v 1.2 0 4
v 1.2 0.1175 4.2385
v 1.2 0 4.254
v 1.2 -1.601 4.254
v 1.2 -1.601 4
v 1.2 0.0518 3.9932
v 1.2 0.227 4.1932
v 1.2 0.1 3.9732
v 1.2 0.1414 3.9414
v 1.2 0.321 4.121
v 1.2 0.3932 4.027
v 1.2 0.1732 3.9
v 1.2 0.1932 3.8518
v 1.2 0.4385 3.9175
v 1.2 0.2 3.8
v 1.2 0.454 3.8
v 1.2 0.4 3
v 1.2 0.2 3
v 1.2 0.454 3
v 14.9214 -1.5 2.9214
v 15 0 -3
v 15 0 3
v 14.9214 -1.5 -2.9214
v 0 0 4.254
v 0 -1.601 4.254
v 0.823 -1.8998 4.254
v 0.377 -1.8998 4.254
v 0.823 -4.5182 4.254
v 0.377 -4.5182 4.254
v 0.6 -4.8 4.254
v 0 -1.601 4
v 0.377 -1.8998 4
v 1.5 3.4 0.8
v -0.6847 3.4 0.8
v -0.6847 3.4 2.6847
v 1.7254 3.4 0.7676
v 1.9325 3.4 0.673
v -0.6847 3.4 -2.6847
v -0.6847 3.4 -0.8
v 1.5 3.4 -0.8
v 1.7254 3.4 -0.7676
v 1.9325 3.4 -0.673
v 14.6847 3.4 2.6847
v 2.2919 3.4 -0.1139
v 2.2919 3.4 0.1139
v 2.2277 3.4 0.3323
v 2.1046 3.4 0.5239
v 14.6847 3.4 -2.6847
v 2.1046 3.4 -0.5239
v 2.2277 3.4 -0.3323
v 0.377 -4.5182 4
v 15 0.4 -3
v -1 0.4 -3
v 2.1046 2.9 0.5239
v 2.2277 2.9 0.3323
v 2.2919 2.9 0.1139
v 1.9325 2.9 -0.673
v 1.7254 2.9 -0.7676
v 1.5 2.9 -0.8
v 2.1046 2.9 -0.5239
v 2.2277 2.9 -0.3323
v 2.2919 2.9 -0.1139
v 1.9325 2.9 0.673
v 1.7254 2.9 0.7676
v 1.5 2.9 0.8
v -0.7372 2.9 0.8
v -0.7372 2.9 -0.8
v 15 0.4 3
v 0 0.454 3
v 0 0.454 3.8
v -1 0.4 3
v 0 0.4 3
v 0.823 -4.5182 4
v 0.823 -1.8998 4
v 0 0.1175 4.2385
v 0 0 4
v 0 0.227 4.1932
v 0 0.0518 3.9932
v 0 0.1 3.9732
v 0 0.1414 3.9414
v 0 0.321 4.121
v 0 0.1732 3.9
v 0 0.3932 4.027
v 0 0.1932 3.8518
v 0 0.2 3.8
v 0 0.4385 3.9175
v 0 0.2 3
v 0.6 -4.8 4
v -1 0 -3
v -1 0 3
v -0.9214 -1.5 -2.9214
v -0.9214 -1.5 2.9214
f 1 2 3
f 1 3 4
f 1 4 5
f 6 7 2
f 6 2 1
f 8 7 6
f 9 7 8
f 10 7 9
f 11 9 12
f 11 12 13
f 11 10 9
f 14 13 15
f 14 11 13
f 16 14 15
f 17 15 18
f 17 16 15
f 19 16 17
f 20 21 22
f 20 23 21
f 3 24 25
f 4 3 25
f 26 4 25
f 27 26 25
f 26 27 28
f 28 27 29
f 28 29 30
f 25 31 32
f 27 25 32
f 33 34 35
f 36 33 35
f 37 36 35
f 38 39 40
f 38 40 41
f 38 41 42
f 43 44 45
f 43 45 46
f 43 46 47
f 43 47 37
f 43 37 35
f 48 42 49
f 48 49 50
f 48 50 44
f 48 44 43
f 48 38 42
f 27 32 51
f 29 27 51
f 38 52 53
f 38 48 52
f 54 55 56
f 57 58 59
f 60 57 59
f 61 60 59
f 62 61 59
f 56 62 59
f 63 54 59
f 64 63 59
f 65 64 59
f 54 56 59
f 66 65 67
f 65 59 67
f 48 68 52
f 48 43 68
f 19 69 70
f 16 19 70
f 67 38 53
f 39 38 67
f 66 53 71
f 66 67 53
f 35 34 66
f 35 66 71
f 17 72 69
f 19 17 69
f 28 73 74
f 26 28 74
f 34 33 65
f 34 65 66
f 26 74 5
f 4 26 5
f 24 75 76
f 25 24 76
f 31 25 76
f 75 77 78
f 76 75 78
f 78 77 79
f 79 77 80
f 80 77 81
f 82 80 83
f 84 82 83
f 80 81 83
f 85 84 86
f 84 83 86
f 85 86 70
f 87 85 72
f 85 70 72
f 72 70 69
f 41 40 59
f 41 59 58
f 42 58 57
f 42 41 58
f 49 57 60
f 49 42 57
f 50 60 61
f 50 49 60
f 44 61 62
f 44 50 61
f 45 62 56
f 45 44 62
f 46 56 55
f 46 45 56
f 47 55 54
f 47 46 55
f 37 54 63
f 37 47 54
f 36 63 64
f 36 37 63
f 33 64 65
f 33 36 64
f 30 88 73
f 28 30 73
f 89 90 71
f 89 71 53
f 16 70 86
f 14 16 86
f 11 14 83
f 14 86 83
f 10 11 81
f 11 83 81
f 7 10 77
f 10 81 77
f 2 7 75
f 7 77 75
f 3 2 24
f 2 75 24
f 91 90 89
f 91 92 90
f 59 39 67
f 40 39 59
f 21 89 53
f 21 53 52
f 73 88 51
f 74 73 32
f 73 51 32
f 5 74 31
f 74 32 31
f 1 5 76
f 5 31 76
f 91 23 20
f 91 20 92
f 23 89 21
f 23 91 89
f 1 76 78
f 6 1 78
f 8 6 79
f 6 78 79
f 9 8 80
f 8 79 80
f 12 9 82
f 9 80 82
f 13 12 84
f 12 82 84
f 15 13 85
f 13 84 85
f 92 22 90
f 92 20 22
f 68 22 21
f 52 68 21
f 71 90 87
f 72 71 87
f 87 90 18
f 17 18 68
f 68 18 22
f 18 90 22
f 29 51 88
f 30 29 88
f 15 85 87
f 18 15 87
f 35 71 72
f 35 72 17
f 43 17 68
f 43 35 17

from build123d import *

# Parameters (mm, degrees)
SKETCH_1_W          = 16
SKETCH_1_H          = 6
EXTRUDE_1_DEPTH     = 0.4
SKETCH_2_W          = 16
SKETCH_2_H          = 6
EXTRUDE_2_DEPTH     = 3
EXTRUDE_2_TAPER     = 6
SKETCH_3_W          = 16
SKETCH_3_H          = 6
EXTRUDE_3_DEPTH     = 1.5
EXTRUDE_3_TAPER     = 3
CUT_EXTRUDE_4_DEPTH = 0.5
EXTRUDE_1_2_DEPTH   = 1.2
CUT_EXTRUDE_START   = -0.254
CUT_EXTRUDE_5_DEPTH = 0.254


# Read off the part's stored shape, not the designer's step: 伸長-薄件1
with BuildPart() as part:
    # 草圖1 → Extrude 1 (new body)
    with BuildSketch(Plane(origin=(0, 0, 0), x_dir=(1, 0, 0), z_dir=(0, 1, 0))):
        with Locations((7, 0)):
            Rectangle(SKETCH_1_W, SKETCH_1_H)
    extrude(amount=EXTRUDE_1_DEPTH)

    # 草圖2 → 伸長2 (add)
    with BuildSketch(Plane(origin=(0, 0.4, 0), x_dir=(1, 0, 0), z_dir=(0, 1, 0))):
        with Locations((7, 0)):
            Rectangle(SKETCH_2_W, SKETCH_2_H)
    extrude(amount=EXTRUDE_2_DEPTH, taper=EXTRUDE_2_TAPER)

    # 草圖3 → 伸長3 (add)
    with BuildSketch(Plane(origin=(0, 0, 0), x_dir=(-1, 0, 0), z_dir=(0, -1, 0))):
        with Locations((-7, 0)):
            Rectangle(SKETCH_3_W, SKETCH_3_H)
    extrude(amount=EXTRUDE_3_DEPTH, taper=EXTRUDE_3_TAPER)

    # 草圖4 → 伸長4 (cut)
    with BuildSketch(Plane(origin=(0, 3.4, 0), x_dir=(1, 0, 0), z_dir=(0, 1, 0))):
        with BuildLine():
            Line((-1, 0.8), (1.5, 0.8))
            ThreePointArc((1.5, 0.8), (2.3, 0), (1.5, -0.8))
            Line((1.5, -0.8), (-1, -0.8))
            Line((-1, -0.8), (-1, 0.8))
        make_face()
    extrude(amount=-CUT_EXTRUDE_4_DEPTH, mode=Mode.SUBTRACT)

    # Extrude 1 2 outline → Extrude 1 2 (add)
    with BuildSketch(Plane(origin=(0, 0, 0), x_dir=(0, 0, -1), z_dir=(1, 0, 0))):
        with BuildLine():
            Line((-3, 0.2), (-3, 0.454))
            Line((-3, 0.454), (-3.8, 0.454))
            ThreePointArc((-3.8, 0.454), (-4.121026479, 0.321026479), (-4.254, 0))
            Line((-4.254, 0), (-4.254, -4.8))
            Line((-4.254, -4.8), (-4, -4.8))
            Line((-4, -4.8), (-4, 0))
            ThreePointArc((-4, 0), (-3.941421356, 0.141421356), (-3.8, 0.2))
            Line((-3.8, 0.2), (-3, 0.2))
        make_face()
    extrude(amount=EXTRUDE_1_2_DEPTH)

    # 草圖6 → 伸長5 (cut)
    with BuildSketch(Plane.XY.offset(4.254).offset(CUT_EXTRUDE_START)):
        Polygon((0.6, -4.8), (0.823031072, -4.518152134), (0.823031072, -1.899802565), (1.593384633, -1.289166003), (1.593384633, -5.180880526), (-0.393384633, -5.180880526), (-0.393384633, -1.289166003), (0.376968928, -1.899802565), (0.376968928, -4.518152134), align=None)
    extrude(amount=CUT_EXTRUDE_5_DEPTH, mode=Mode.SUBTRACT)


solid = part.part
